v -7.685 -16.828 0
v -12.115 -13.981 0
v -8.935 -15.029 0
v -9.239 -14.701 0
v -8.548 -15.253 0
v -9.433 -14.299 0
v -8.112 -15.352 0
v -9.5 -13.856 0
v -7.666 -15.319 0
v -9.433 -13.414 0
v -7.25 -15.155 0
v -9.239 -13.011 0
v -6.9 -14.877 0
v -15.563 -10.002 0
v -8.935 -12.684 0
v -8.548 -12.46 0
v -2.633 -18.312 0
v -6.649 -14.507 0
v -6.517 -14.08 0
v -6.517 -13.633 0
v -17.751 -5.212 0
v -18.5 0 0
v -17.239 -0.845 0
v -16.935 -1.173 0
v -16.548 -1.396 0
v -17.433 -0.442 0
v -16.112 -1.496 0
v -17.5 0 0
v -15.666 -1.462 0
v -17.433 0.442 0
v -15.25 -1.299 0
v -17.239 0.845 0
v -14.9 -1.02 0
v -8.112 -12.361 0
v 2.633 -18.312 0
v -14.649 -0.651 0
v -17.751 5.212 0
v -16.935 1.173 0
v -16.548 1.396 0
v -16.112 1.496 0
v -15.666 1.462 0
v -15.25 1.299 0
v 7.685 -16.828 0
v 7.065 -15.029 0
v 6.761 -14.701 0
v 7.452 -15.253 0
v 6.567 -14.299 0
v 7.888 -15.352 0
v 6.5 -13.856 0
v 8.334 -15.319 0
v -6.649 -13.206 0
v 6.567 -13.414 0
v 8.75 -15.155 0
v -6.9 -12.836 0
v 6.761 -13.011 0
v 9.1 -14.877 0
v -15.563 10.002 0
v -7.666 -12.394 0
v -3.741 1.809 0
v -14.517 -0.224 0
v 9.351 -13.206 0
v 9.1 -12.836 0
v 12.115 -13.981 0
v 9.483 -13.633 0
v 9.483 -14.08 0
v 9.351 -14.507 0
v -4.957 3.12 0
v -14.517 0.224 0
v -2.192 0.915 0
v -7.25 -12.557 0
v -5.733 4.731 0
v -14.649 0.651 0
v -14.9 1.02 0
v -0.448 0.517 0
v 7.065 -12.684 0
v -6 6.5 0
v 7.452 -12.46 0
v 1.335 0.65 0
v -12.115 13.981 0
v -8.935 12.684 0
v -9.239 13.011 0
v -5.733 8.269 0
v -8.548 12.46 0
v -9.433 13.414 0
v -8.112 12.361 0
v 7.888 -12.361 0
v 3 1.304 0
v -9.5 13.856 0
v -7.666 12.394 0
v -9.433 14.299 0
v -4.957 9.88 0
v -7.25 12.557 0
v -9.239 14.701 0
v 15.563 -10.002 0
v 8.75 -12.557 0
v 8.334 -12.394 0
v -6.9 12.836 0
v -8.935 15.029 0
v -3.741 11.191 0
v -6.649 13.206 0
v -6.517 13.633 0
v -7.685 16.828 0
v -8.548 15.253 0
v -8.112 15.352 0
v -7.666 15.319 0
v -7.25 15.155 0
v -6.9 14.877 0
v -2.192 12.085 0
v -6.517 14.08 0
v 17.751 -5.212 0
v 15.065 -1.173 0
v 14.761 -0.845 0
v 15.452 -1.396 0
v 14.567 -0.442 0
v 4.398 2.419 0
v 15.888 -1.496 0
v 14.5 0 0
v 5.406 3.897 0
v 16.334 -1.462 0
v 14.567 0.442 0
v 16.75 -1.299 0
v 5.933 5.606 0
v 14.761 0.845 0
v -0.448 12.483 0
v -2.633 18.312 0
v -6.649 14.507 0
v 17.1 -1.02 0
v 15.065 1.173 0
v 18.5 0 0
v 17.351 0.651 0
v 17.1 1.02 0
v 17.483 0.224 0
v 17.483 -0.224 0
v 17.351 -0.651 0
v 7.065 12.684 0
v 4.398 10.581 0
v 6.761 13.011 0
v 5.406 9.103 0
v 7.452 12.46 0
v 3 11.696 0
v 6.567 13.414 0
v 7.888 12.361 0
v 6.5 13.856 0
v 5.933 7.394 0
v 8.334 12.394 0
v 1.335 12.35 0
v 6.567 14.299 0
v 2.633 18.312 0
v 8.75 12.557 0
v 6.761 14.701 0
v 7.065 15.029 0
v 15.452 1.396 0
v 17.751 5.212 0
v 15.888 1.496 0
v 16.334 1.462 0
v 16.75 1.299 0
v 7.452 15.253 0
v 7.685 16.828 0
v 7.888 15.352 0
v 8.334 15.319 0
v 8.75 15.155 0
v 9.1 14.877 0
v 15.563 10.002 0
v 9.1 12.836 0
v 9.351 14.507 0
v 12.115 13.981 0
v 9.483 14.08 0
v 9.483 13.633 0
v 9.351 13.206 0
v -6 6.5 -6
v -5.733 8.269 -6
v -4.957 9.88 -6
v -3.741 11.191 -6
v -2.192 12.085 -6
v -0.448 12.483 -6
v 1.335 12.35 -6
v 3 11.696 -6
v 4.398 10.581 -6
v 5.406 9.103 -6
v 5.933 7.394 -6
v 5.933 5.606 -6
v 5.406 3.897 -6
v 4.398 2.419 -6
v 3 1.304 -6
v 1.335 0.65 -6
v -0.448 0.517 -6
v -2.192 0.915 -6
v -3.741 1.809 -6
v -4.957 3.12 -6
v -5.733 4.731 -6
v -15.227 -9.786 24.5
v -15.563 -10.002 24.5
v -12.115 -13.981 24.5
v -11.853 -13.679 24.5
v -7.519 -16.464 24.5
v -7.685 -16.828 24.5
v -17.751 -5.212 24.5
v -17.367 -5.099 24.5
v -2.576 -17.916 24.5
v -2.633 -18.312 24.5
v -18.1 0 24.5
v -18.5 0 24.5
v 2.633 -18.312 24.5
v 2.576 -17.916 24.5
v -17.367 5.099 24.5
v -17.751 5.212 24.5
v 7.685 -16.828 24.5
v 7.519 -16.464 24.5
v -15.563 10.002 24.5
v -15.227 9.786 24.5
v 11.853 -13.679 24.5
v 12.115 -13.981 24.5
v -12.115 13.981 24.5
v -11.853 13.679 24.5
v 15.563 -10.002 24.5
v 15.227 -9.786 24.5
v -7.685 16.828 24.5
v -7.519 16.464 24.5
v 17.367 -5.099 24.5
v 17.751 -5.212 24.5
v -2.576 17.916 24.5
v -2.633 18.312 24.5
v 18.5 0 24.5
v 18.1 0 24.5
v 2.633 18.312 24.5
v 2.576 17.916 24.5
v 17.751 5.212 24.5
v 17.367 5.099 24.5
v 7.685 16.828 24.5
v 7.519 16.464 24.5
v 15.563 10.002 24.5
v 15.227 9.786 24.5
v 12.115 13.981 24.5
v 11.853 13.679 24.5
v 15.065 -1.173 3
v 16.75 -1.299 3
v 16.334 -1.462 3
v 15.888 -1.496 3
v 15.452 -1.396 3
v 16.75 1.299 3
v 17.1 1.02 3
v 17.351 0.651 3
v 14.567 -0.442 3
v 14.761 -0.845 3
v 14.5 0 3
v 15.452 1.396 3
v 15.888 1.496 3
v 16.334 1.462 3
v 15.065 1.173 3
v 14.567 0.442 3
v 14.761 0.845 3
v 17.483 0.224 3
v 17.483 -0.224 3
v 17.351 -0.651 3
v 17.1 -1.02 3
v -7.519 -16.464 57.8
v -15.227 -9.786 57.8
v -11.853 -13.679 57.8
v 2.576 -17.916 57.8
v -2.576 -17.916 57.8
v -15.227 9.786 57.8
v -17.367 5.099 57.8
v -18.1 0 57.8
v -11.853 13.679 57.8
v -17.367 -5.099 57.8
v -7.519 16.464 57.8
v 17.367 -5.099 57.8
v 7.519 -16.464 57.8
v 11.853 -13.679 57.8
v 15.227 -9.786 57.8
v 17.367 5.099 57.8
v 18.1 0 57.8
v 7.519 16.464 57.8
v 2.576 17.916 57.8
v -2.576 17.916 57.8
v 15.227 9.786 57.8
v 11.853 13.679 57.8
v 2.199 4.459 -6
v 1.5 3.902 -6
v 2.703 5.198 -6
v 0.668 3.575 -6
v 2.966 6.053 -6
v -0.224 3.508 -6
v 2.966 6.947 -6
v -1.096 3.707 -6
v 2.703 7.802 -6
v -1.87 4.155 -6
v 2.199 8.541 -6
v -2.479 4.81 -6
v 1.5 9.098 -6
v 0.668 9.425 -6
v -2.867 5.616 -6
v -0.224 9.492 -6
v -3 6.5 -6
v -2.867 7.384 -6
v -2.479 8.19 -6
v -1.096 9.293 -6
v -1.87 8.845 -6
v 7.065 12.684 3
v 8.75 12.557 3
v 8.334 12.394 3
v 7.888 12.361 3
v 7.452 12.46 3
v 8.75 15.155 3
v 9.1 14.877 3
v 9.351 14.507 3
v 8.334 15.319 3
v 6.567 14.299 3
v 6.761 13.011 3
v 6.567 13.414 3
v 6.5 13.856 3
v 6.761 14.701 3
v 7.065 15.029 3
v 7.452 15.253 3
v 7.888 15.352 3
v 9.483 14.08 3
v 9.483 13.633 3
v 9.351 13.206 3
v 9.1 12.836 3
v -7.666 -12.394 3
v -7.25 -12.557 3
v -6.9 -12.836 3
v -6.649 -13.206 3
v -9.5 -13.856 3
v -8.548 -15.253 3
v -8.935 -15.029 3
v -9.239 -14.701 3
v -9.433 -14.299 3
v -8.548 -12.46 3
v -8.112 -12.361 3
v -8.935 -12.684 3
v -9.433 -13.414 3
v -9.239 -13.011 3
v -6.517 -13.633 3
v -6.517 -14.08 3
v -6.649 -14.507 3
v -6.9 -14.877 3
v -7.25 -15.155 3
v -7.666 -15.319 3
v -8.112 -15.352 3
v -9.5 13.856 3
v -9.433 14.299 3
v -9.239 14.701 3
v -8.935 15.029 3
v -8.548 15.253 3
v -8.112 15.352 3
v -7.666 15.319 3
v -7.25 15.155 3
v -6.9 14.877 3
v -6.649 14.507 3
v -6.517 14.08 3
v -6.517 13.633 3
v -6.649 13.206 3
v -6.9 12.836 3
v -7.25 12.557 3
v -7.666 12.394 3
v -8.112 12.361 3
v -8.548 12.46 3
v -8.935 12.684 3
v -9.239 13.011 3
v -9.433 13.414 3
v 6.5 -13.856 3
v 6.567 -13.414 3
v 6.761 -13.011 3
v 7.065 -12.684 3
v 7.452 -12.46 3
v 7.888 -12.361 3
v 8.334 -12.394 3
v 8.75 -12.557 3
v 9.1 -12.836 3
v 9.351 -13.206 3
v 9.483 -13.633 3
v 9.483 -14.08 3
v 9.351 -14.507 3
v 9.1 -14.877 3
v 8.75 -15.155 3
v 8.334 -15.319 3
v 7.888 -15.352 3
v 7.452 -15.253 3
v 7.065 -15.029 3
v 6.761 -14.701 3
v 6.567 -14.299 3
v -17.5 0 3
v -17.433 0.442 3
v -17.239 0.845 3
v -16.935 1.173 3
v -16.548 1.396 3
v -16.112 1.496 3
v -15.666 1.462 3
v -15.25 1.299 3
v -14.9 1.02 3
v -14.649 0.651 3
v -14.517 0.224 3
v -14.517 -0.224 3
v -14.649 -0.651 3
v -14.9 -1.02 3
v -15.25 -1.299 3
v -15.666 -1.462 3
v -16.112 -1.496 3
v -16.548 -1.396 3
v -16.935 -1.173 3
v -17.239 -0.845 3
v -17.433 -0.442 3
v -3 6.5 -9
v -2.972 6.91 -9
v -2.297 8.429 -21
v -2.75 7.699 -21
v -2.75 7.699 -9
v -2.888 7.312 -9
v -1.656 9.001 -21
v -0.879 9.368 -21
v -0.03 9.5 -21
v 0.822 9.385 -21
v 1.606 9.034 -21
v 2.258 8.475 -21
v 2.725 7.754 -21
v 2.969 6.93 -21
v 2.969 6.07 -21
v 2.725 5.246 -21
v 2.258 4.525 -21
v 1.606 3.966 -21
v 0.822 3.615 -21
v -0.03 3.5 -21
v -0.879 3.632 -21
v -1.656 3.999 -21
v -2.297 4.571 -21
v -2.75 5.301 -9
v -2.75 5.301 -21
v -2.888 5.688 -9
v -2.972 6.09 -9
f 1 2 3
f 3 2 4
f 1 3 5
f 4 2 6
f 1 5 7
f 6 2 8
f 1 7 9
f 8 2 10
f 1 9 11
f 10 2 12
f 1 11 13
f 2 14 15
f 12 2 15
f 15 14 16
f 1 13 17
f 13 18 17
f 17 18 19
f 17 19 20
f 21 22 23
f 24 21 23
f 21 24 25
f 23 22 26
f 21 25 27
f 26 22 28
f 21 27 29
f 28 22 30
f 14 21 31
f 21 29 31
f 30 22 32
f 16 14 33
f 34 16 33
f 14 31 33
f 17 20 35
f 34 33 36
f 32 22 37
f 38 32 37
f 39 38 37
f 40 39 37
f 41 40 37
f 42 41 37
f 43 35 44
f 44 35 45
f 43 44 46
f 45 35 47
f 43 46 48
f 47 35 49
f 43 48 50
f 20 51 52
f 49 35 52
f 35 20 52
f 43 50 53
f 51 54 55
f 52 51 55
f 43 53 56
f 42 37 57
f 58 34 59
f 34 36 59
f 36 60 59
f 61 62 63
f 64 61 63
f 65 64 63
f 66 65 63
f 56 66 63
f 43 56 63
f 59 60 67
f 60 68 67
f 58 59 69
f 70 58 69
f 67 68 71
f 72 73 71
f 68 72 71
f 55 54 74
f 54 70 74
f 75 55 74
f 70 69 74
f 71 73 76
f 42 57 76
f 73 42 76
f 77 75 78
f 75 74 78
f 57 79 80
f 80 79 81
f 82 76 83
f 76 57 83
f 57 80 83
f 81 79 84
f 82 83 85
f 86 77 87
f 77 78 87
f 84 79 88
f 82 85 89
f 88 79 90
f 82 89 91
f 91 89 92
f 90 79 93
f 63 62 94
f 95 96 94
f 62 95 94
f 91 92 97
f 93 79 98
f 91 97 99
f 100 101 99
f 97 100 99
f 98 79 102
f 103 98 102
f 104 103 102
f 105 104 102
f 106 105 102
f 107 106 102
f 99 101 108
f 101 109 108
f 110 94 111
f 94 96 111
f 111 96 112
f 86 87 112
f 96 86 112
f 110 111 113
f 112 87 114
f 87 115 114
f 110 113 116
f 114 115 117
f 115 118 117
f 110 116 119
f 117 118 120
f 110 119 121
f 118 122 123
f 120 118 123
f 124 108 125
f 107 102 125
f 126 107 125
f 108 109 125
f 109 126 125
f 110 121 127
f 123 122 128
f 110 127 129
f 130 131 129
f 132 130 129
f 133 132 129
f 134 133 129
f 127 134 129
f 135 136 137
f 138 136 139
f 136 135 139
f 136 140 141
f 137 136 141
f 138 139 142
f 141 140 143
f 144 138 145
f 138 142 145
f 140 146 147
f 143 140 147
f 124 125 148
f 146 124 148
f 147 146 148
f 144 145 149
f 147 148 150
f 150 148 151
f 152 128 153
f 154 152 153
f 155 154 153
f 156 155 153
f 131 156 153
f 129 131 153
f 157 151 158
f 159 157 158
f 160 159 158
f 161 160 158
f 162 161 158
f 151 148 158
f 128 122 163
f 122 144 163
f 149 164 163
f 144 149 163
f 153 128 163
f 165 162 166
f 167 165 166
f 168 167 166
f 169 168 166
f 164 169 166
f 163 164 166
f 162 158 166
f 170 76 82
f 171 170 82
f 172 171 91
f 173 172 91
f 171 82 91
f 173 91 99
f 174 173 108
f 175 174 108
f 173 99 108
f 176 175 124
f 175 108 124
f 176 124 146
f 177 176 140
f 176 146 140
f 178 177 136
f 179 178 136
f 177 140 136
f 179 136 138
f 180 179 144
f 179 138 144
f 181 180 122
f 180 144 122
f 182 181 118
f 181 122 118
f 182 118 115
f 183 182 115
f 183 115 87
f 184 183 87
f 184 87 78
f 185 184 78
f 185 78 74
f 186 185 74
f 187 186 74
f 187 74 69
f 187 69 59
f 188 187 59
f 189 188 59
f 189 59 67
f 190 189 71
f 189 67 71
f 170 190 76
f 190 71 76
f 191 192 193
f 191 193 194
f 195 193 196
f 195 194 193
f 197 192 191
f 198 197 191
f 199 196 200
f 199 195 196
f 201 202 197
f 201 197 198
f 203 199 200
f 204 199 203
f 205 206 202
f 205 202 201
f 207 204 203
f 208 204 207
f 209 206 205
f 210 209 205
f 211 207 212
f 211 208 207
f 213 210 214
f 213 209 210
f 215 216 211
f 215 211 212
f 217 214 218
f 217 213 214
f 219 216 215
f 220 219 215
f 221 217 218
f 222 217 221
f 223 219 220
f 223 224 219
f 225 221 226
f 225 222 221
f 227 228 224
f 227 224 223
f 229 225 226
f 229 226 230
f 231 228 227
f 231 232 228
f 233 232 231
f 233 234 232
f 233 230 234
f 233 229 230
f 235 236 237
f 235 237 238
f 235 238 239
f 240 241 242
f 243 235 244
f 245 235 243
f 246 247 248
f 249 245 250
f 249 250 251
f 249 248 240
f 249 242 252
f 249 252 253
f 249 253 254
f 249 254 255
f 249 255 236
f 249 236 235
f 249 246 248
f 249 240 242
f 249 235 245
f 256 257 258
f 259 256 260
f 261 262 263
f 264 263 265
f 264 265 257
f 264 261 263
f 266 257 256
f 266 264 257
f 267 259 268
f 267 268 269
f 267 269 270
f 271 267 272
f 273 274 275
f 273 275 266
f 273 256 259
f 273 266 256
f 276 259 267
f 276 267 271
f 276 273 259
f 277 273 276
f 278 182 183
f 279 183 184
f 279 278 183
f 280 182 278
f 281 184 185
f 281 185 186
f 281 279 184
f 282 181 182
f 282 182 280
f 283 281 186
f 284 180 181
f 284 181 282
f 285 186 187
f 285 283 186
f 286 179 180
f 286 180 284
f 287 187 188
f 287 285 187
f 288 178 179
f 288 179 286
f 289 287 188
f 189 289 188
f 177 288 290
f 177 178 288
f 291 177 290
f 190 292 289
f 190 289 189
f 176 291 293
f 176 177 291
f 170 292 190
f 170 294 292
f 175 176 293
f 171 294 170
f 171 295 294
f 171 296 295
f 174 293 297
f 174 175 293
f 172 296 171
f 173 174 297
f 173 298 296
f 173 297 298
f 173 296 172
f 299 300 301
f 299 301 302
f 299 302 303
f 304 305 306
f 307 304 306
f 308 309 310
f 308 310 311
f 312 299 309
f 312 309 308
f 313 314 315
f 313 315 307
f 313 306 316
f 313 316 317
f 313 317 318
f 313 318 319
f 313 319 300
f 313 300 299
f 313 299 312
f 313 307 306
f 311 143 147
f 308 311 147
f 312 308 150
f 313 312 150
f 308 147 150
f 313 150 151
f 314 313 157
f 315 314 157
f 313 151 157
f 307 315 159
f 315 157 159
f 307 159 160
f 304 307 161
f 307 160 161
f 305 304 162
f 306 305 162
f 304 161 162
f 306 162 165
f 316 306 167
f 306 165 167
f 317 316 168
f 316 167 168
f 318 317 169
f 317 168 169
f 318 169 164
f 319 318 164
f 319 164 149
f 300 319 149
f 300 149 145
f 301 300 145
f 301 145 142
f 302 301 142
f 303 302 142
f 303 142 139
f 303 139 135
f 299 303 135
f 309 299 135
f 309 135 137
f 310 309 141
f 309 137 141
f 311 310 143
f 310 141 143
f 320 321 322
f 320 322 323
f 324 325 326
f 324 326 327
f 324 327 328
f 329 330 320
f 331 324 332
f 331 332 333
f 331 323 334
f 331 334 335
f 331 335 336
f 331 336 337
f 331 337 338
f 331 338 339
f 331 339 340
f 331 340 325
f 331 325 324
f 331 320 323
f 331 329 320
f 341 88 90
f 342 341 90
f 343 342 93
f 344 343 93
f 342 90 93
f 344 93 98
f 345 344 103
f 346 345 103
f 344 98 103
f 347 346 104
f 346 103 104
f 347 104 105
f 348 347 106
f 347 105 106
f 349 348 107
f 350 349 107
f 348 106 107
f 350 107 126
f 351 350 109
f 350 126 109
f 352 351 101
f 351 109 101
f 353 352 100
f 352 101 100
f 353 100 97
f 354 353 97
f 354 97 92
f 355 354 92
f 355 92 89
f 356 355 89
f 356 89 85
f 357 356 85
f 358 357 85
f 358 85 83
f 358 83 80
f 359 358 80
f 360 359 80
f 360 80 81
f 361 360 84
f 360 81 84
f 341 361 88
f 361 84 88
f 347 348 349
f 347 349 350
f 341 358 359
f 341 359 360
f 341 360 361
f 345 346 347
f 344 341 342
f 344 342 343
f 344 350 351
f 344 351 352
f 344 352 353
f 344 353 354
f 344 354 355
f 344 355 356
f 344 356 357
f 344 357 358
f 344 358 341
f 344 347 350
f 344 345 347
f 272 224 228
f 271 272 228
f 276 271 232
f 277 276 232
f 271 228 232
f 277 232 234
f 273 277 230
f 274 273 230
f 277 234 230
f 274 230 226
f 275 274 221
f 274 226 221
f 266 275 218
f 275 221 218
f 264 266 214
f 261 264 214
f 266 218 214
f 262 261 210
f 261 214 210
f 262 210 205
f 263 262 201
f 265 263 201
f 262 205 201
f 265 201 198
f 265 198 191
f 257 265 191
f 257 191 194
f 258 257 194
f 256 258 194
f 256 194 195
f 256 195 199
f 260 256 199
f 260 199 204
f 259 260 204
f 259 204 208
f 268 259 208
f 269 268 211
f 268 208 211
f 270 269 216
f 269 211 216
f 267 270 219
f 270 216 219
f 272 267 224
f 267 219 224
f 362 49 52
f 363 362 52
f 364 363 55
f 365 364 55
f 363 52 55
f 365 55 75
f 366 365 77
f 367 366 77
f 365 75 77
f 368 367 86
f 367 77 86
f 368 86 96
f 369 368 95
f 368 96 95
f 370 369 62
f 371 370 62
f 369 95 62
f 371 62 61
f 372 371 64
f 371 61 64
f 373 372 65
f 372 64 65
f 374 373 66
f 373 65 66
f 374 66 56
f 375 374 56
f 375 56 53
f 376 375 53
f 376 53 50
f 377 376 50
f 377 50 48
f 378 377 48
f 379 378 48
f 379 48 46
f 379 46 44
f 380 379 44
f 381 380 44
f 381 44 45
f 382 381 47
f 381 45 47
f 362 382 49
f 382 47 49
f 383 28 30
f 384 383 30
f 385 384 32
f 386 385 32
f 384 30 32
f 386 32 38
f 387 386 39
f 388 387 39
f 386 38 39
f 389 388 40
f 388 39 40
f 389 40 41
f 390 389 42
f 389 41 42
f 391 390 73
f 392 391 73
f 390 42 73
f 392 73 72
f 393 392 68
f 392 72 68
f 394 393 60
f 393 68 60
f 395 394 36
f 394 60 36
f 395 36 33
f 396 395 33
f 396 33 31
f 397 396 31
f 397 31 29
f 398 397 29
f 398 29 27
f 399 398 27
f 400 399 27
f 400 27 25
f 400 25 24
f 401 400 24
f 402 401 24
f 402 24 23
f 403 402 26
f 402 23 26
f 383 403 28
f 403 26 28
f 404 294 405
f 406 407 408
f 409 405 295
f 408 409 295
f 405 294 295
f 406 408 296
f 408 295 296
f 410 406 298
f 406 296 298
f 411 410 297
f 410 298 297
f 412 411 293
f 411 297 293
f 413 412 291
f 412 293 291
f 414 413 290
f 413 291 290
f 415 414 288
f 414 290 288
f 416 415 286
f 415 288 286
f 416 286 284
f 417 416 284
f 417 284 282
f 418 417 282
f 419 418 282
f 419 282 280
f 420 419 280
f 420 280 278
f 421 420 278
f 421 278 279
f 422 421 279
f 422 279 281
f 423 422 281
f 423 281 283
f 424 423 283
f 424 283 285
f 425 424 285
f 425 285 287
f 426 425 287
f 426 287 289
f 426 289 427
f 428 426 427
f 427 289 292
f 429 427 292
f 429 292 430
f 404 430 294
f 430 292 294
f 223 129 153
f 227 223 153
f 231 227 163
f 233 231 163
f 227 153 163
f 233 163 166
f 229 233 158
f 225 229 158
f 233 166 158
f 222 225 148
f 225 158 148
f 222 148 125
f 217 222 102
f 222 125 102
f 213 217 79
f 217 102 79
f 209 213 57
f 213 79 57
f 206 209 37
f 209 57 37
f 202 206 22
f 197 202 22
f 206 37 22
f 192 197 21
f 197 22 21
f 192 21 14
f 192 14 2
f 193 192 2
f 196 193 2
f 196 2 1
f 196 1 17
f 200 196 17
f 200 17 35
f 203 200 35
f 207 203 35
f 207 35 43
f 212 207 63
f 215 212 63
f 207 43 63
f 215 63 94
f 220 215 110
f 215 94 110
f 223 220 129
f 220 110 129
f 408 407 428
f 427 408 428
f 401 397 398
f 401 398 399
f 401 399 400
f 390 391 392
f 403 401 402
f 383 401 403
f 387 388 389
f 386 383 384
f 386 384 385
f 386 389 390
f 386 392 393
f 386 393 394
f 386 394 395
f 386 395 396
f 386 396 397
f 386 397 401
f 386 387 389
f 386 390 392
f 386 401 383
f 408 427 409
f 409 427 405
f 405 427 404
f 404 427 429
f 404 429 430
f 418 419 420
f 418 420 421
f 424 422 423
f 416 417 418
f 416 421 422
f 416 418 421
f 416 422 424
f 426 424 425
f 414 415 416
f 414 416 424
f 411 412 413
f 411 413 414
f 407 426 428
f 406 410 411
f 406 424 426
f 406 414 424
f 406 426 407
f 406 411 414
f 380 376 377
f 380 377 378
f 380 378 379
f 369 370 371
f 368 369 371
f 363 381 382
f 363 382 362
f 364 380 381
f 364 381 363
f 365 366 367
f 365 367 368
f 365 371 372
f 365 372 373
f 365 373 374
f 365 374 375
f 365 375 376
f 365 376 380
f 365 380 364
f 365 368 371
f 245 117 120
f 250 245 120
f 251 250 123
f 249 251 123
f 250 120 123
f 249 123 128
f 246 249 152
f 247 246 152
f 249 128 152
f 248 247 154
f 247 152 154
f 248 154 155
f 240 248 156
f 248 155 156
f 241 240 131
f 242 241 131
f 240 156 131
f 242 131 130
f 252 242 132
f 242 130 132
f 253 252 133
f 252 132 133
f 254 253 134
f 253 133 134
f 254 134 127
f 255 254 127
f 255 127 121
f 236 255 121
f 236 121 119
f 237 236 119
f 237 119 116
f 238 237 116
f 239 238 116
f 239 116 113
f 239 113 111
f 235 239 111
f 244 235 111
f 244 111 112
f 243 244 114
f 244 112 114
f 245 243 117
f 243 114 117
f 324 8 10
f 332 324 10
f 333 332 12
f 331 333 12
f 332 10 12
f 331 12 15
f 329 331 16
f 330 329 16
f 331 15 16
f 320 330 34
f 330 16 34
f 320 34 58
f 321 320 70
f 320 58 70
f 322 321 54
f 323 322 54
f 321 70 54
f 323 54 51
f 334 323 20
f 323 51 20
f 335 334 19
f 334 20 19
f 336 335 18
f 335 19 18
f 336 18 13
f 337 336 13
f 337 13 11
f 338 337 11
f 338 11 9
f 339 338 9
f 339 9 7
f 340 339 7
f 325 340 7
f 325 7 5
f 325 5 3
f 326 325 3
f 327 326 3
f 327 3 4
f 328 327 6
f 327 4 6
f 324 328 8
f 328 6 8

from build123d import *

# Parameters (mm, degrees)
SKETCH1_R           = 18.5
BOSS_EXTRUDE1_DEPTH = 24.5
SKETCH2_R           = 18.1
BOSS_EXTRUDE2_DEPTH = 33.3
SKETCH4_R           = 6
BOSS_EXTRUDE3_DEPTH = 6
SKETCH5_R           = 3
BOSS_EXTRUDE4_DEPTH = 15
CUT_EXTRUDE1_DEPTH  = 12
FACE_DIAMENTIONS_R  = 1.5
CUT_EXTRUDE3_DEPTH  = 3


with BuildPart() as part:
    # Sketch1 → Boss-Extrude1 (new body)
    with BuildSketch(Plane.XY):
        Circle(SKETCH1_R)
    extrude(amount=BOSS_EXTRUDE1_DEPTH)

    # Sketch2 → Boss-Extrude2 (add)
    with BuildSketch(Plane.XY.offset(24.5)):
        Circle(SKETCH2_R)
    extrude(amount=BOSS_EXTRUDE2_DEPTH)

    # Sketch4 → Boss-Extrude3 (add)
    with BuildSketch(Plane(origin=(0, 0, 0), x_dir=(-1, 0, 0), z_dir=(0, 0, -1))):
        with Locations((0, 6.5)):
            Circle(SKETCH4_R)
    extrude(amount=BOSS_EXTRUDE3_DEPTH)

    # Sketch5 → Boss-Extrude4 (add)
    with BuildSketch(Plane(origin=(0, 0, -6), x_dir=(-1, 0, 0), z_dir=(0, 0, -1))):
        with Locations((0, 6.5)):
            Circle(SKETCH5_R)
    extrude(amount=BOSS_EXTRUDE4_DEPTH)

    # Sketch6 → Cut-Extrude1 (cut)
    with BuildSketch(Plane(origin=(0, 0, -21), x_dir=(-1, 0, 0), z_dir=(0, 0, -1))):
        with BuildLine():
            Line((2.75, 6.5), (2.75, 5.301042119))
            ThreePointArc((2.75, 5.301042119), (3, 6.5), (2.75, 7.698957881))
            Line((2.75, 7.698957881), (2.75, 6.5))
        make_face()
    extrude(amount=-CUT_EXTRUDE1_DEPTH, mode=Mode.SUBTRACT)

    # face diamentions → Cut-Extrude3 (cut)
    with BuildSketch(Plane(origin=(0, 0, 0), x_dir=(-1, 0, 0), z_dir=(0, 0, -1))):
        with Locations((-16, 0)):
            Circle(FACE_DIAMENTIONS_R)
        with Locations((8, 13.856406461)):
            Circle(FACE_DIAMENTIONS_R)
        with Locations((8, -13.856406461)):
            Circle(FACE_DIAMENTIONS_R)
        with Locations((16, 0)):
            Circle(FACE_DIAMENTIONS_R)
        with Locations((-8, -13.856406461)):
            Circle(FACE_DIAMENTIONS_R)
        with Locations((-8, 13.856406461)):
            Circle(FACE_DIAMENTIONS_R)
    extrude(amount=-CUT_EXTRUDE3_DEPTH, mode=Mode.SUBTRACT)


solid = part.part
